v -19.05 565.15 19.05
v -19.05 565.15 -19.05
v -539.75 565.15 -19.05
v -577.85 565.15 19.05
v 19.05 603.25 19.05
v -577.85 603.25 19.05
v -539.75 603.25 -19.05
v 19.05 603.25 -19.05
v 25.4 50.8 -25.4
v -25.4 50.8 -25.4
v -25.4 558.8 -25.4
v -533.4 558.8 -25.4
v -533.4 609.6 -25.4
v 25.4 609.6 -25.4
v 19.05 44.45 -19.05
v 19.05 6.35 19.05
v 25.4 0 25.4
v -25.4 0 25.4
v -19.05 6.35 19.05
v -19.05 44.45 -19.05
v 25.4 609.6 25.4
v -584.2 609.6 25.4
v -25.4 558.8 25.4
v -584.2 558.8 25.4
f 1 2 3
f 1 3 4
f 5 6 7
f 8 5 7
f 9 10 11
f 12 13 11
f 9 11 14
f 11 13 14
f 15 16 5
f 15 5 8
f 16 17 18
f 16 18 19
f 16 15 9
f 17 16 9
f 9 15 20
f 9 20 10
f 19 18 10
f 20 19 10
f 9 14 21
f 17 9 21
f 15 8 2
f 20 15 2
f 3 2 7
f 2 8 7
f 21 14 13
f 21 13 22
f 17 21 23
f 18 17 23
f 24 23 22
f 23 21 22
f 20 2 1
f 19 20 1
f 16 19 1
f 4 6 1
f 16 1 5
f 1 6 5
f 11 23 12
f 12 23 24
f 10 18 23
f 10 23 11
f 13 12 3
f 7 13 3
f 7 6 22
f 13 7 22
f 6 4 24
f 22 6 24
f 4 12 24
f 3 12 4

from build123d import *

# Parameters (mm, degrees)
F1_W     = 50.8
F1_H     = 50.8
F1_W_2   = 38.1
F1_H_2   = 38.1
F4_DEPTH = 50.801
F6_DEPTH = 50.801


with BuildPart() as f2:
    # F2: sweep along a path in F0
    with BuildLine(Plane.XY) as f2_path:
        Line((0, 0), (0, 584.2))
        Line((0, 584.2), (-584.2, 584.2))
    # F1 (on Front) → F2 (sweep)
    with BuildSketch(Plane.XZ):
        Rectangle(F1_W, F1_H)
        Rectangle(F1_W_2, F1_H_2, mode=Mode.SUBTRACT)
    sweep(path=f2_path.line, transition=Transition.RIGHT)

    # F3 (on face) → F4 (cut, through all)
    with BuildSketch(Plane(origin=(-25.4, 0, 0), x_dir=(0, -1, 0), z_dir=(-1, 0, 0))):
        Polygon((0, -25.4), (0, 25.4), (-50.8, -25.4), align=None)
    extrude(amount=-F4_DEPTH, mode=Mode.SUBTRACT)

    # F5 (on face) → F6 (cut, through all)
    with BuildSketch(Plane.XZ.offset(-558.8)):
        Polygon((-584.2, 25.4), (-584.2, -25.4), (-533.4, -25.4), align=None)
    extrude(amount=-F6_DEPTH, mode=Mode.SUBTRACT)


solid = f2.part
